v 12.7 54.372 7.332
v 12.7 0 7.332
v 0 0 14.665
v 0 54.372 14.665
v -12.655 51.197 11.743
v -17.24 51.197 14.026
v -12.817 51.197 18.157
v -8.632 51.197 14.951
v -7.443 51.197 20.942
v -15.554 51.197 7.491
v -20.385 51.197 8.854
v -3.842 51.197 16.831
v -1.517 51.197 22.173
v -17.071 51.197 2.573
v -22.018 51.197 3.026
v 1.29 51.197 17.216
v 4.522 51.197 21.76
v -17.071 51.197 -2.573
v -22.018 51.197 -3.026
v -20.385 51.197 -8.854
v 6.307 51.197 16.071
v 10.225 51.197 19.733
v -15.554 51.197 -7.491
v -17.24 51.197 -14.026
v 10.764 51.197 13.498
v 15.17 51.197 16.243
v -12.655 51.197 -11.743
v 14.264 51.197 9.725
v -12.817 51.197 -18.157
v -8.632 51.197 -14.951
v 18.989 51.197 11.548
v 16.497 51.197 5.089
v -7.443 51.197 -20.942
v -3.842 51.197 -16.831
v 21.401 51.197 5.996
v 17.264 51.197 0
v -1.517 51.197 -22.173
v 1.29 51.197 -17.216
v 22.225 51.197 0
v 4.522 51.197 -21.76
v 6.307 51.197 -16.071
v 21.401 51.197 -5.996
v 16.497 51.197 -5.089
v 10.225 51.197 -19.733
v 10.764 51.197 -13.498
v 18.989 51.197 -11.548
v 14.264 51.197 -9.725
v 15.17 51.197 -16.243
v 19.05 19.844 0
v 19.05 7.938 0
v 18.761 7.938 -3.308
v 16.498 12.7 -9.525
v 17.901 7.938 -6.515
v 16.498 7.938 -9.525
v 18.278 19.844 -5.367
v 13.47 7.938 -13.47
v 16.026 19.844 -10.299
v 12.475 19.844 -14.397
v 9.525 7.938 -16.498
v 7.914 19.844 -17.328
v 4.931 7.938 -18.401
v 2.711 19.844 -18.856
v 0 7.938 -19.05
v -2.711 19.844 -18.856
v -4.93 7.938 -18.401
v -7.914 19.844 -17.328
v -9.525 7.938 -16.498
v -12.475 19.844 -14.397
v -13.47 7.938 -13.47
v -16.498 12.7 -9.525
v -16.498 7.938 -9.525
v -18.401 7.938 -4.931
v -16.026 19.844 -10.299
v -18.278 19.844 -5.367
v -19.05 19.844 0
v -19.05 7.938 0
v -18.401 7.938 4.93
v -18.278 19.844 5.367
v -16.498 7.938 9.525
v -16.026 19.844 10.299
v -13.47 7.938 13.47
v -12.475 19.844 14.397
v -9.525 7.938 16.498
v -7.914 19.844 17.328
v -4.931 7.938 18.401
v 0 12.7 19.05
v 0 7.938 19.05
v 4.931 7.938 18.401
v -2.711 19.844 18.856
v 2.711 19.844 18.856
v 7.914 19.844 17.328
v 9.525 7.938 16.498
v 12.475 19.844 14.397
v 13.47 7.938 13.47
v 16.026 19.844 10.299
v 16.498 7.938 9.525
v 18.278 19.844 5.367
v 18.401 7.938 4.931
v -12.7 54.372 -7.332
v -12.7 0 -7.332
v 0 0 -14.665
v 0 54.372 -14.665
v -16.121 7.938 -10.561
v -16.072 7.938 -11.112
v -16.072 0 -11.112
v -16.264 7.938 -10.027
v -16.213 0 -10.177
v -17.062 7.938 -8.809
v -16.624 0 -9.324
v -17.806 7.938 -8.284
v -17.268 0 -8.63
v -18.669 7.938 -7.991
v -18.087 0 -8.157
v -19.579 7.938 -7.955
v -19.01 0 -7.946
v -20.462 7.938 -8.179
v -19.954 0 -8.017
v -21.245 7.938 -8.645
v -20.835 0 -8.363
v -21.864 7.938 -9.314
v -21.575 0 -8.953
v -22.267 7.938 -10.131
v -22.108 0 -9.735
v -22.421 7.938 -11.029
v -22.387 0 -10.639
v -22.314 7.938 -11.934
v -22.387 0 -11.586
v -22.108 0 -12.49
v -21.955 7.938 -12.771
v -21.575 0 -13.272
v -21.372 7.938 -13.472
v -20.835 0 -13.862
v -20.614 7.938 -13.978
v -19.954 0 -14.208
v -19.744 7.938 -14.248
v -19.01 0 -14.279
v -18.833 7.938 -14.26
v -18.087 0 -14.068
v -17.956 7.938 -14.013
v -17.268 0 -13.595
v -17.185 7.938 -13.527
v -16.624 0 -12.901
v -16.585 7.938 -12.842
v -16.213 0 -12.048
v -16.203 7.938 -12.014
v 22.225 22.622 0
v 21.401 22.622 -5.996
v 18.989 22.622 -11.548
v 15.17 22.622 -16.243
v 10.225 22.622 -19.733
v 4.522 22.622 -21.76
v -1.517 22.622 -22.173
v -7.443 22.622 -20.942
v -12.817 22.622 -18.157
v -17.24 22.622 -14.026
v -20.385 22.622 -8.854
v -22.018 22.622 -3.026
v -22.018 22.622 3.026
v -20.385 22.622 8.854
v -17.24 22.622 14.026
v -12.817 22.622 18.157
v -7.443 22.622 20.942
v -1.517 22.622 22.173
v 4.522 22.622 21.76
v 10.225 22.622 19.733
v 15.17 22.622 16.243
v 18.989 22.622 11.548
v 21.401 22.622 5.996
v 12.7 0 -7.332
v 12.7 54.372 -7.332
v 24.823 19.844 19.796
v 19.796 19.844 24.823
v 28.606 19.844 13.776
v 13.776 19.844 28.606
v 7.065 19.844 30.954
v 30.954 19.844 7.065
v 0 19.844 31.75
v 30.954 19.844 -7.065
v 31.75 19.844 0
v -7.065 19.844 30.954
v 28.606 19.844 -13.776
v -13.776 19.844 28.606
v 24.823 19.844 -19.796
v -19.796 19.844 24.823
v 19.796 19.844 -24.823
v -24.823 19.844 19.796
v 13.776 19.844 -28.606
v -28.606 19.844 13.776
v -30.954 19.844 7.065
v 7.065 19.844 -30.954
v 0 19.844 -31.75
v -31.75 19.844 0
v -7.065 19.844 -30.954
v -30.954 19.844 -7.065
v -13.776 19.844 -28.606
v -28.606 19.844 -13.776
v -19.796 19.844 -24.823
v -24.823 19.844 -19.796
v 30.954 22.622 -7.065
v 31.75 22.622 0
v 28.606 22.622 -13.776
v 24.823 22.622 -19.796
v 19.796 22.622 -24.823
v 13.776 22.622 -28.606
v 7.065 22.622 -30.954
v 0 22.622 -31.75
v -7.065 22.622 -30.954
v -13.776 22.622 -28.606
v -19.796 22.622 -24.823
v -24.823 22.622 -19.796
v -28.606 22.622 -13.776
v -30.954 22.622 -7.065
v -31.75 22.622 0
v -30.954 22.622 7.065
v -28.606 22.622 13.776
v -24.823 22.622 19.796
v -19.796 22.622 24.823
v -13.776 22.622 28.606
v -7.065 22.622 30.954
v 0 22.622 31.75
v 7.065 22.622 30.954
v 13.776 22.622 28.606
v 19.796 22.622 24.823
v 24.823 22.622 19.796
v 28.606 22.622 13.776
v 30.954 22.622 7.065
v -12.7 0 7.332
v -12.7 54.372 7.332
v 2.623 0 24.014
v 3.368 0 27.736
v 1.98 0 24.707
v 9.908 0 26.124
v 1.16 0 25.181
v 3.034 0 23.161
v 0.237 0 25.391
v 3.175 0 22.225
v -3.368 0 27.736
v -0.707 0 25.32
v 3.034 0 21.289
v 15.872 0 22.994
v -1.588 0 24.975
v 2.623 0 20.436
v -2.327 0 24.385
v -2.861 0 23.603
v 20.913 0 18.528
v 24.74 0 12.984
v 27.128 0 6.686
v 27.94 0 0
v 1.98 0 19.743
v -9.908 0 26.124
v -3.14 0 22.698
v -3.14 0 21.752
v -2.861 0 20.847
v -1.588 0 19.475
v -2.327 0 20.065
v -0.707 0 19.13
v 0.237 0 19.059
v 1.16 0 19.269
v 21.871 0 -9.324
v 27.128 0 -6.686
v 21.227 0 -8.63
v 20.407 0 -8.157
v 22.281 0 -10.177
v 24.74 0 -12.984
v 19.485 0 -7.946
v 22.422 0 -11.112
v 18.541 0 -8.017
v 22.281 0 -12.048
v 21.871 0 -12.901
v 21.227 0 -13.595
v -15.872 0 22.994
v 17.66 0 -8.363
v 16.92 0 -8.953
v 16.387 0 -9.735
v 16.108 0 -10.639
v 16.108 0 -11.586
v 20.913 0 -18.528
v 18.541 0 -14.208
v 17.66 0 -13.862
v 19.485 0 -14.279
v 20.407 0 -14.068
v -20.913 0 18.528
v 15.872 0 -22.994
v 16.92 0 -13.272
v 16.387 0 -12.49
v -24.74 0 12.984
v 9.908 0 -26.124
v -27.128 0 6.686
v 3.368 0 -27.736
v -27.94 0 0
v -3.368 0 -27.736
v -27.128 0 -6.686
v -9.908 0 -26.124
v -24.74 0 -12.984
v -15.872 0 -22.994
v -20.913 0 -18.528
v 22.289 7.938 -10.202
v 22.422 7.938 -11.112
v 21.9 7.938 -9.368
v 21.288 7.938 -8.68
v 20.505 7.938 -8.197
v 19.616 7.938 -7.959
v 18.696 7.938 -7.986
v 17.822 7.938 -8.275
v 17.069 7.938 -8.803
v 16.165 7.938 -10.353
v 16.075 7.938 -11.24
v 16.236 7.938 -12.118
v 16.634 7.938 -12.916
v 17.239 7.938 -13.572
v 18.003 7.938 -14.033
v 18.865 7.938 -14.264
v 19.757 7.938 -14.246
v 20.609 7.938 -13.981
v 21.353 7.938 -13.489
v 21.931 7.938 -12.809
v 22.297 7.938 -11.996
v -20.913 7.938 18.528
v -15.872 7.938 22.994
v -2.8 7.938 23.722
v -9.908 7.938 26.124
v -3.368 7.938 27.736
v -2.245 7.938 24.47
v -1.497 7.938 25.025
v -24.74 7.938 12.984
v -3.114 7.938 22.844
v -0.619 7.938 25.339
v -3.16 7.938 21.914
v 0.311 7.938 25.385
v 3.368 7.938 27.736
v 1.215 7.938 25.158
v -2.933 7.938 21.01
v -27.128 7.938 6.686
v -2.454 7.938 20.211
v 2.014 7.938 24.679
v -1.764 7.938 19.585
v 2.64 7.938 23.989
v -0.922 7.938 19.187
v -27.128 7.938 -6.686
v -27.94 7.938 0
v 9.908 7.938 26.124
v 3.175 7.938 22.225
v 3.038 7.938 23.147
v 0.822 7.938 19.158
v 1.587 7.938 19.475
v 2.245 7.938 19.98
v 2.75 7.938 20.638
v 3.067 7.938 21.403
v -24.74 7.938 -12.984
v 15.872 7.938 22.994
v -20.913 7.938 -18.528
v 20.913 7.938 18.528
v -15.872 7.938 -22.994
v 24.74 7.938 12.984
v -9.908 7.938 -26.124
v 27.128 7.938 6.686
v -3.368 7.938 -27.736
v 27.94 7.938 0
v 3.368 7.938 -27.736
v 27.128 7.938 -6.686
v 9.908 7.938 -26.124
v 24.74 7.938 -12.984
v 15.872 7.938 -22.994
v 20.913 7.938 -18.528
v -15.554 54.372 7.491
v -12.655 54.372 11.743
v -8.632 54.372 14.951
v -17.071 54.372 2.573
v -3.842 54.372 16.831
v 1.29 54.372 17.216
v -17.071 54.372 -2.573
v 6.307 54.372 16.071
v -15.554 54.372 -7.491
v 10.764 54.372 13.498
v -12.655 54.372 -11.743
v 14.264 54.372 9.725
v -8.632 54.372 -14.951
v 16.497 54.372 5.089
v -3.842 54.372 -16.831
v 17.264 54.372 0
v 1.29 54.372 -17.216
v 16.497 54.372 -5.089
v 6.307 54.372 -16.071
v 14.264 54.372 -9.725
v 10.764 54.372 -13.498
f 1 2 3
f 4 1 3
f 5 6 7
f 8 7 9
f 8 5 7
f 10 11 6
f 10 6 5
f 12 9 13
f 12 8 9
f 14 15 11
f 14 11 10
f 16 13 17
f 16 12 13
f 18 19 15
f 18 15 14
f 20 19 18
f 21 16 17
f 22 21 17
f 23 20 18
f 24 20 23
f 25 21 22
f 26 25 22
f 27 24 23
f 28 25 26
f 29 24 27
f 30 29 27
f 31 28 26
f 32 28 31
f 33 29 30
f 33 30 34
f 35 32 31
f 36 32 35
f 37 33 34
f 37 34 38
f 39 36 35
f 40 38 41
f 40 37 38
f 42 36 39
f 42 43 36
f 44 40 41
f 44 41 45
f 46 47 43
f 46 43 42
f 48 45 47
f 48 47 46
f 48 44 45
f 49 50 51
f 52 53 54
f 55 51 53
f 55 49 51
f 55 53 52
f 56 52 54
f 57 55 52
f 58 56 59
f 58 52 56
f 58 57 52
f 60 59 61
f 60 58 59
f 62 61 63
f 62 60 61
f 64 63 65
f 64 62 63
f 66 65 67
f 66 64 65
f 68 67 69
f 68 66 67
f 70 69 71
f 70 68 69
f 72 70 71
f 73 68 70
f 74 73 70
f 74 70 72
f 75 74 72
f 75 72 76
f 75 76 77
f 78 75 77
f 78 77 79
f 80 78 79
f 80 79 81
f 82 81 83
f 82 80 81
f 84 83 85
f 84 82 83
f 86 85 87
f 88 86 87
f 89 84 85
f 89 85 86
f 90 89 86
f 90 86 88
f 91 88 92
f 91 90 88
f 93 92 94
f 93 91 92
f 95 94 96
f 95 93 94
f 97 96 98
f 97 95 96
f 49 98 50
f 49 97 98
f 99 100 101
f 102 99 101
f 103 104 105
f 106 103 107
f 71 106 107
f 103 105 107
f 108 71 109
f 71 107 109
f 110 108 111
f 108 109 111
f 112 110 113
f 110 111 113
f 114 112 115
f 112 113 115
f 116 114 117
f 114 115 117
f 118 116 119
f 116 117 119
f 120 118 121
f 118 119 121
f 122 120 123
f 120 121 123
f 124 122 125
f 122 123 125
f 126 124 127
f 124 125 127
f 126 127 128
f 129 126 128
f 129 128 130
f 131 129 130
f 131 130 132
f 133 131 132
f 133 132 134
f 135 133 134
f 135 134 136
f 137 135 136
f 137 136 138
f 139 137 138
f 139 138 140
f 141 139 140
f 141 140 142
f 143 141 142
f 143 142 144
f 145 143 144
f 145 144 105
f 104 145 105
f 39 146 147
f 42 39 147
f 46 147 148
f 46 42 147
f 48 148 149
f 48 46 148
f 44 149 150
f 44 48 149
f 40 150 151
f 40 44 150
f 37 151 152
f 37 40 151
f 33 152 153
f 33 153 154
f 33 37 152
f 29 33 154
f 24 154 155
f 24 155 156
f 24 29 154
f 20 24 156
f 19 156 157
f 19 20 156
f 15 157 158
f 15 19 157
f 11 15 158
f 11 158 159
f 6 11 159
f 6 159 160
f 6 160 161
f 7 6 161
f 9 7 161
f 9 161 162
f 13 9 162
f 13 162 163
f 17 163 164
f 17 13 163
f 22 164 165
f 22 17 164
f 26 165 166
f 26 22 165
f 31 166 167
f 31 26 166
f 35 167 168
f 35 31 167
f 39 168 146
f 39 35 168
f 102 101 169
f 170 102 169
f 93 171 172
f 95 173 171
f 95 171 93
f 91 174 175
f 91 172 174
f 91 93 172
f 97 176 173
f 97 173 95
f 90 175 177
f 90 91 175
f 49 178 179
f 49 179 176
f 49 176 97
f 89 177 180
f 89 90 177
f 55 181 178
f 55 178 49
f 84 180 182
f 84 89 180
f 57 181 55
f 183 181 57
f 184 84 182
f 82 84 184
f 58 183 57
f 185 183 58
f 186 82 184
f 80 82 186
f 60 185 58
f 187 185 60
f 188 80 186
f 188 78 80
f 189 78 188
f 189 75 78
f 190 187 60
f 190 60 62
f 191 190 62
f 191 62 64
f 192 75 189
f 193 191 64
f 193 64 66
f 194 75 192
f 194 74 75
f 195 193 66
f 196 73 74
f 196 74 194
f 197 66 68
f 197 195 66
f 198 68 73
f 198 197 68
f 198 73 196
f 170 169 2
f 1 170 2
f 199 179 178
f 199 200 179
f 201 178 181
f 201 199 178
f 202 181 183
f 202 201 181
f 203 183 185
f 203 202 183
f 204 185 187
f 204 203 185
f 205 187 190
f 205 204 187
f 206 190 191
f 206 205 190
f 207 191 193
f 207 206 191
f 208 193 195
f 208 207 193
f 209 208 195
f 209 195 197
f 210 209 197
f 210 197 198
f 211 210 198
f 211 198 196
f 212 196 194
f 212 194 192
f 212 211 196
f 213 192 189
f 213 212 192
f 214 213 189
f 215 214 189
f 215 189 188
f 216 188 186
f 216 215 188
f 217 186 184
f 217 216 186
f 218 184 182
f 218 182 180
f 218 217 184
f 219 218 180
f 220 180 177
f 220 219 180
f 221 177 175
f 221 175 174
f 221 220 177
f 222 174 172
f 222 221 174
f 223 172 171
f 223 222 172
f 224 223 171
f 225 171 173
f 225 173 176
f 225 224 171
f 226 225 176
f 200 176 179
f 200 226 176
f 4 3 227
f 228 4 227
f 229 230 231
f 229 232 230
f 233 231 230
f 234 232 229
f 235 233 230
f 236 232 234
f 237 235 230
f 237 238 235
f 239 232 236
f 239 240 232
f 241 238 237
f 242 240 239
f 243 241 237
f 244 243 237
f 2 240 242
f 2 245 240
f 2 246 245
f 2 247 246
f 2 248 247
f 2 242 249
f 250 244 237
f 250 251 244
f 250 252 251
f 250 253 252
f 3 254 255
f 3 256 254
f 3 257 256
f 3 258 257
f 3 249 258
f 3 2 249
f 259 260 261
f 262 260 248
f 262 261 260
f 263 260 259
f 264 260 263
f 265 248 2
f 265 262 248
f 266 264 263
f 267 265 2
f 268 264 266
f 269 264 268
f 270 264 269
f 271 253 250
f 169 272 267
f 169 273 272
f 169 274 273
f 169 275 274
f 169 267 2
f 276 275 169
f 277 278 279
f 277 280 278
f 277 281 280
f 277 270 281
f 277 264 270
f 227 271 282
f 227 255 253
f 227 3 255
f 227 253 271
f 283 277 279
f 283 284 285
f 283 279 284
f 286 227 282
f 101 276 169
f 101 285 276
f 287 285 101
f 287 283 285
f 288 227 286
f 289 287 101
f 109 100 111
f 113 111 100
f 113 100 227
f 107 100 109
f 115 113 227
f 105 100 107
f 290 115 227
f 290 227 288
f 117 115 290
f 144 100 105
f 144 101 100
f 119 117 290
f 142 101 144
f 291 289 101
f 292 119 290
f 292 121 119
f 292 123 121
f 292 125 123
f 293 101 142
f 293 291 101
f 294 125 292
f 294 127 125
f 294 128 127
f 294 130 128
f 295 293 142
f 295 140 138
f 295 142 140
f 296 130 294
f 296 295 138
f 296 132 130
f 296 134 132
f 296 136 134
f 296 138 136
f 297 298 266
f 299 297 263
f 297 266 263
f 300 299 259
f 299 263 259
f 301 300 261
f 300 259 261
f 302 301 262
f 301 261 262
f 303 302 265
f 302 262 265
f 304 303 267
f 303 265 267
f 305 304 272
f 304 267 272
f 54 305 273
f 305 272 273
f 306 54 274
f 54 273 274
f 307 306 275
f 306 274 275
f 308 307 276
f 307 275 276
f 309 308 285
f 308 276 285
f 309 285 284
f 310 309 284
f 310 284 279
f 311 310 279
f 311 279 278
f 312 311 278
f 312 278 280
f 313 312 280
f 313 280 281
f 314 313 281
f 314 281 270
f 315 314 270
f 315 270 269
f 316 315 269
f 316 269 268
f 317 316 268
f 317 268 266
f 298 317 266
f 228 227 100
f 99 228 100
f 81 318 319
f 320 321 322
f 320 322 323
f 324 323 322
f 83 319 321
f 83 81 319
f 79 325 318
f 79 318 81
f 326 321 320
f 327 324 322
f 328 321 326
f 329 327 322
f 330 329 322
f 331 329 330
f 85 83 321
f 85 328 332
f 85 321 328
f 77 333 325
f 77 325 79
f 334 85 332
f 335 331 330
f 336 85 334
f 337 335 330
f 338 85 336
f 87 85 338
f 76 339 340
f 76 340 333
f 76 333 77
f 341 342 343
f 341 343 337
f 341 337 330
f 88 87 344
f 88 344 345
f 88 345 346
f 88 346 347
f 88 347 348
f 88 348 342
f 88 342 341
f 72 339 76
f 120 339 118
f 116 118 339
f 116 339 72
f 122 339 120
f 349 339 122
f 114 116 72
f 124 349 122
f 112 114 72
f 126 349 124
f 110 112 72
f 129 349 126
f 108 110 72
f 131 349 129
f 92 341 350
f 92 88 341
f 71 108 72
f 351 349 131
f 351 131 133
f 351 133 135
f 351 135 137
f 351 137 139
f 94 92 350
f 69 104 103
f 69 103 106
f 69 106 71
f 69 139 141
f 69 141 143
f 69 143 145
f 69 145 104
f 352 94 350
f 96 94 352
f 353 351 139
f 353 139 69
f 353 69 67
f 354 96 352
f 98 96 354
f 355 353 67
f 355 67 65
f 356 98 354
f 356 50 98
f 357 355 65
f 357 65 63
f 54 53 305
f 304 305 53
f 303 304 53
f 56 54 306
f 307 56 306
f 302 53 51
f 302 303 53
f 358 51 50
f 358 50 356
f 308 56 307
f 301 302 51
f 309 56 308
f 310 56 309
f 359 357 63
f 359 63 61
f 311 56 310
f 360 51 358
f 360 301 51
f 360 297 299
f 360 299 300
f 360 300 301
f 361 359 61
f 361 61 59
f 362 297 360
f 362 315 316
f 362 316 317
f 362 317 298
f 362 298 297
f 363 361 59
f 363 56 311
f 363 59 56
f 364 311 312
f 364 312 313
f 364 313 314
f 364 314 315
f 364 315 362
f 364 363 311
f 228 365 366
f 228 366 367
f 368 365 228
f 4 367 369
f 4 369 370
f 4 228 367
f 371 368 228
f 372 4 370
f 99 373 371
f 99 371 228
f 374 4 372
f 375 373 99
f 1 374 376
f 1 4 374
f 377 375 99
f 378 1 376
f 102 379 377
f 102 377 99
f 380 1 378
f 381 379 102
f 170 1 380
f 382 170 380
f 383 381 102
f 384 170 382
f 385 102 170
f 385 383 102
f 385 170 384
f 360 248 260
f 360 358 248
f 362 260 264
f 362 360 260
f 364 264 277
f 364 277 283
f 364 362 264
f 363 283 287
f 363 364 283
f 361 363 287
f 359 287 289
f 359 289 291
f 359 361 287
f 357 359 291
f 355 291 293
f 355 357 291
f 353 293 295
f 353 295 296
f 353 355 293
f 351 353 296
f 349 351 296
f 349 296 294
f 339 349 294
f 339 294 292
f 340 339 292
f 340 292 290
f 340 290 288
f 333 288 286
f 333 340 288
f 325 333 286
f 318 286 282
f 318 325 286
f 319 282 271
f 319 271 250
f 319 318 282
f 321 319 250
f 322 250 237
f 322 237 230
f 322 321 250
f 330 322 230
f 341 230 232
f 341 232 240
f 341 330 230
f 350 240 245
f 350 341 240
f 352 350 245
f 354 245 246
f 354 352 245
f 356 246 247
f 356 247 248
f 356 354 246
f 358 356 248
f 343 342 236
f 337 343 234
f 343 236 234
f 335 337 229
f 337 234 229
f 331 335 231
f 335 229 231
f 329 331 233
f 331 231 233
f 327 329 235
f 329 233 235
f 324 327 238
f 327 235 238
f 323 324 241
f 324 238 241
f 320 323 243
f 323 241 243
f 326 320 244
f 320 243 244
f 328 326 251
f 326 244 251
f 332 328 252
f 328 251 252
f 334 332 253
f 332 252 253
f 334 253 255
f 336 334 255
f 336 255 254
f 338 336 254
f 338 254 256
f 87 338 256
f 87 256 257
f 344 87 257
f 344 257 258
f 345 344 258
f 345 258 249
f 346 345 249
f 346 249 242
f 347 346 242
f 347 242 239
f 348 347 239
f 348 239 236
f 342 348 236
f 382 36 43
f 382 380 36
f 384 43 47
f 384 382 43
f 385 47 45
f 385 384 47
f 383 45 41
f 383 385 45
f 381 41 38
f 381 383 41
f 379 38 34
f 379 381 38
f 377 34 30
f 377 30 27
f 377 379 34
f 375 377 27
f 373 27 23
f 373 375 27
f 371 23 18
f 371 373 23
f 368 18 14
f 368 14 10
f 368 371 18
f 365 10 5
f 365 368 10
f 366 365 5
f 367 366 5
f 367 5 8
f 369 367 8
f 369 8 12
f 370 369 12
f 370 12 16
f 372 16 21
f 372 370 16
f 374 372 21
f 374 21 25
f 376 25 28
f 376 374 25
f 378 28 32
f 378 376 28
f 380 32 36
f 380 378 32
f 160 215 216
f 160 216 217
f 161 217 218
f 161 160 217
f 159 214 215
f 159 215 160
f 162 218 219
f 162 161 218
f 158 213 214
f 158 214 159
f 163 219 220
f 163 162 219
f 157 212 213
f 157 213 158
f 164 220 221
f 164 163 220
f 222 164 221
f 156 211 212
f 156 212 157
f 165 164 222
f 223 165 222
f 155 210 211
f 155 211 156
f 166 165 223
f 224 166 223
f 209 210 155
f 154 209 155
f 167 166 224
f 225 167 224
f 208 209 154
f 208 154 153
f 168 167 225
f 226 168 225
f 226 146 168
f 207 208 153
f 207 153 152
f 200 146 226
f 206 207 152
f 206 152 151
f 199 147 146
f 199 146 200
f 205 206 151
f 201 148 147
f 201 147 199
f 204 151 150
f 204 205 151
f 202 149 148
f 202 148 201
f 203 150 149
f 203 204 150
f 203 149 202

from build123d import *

# Parameters (mm, degrees)
CUT_EXTRUDE1_DEPTH = 101.6
SKETCH3_R          = 3.175
CUT_EXTRUDE2_DEPTH = 12.7


with BuildPart() as part:
    # Sketch1 → Revolve1 (revolve)
    with BuildSketch(Plane.XY):
        Polygon((0, 0), (27.94, 0), (27.94, 7.9375), (19.05, 7.9375), (19.05, 19.84375), (31.75, 19.84375), (31.75, 22.621875), (22.225, 22.621875), (22.225, 51.196875), (17.2640625, 51.196875), (17.2640625, 54.371875), (0, 54.371875), align=None)
    revolve(axis=Axis((0, 0, 0), (0, 1, 0)))

    # Sketch2 → Cut-Extrude1 (cut)
    with BuildSketch(Plane.XZ):
        Polygon((12.7, 7.332348419), (0, 14.664696837), (-12.7, 7.332348419), (-12.7, -7.332348419), (0, -14.664696837), (12.7, -7.332348419), align=None)
    extrude(amount=-CUT_EXTRUDE1_DEPTH, mode=Mode.SUBTRACT)

    # Sketch3 → Cut-Extrude2 (cut)
    with BuildSketch(Plane.XZ):
        with Locations((0, 22.225)):
            Circle(SKETCH3_R)
        with Locations((19.247414599, -11.1125)):
            Circle(SKETCH3_R)
        with Locations((-19.247414599, -11.1125)):
            Circle(SKETCH3_R)
    extrude(amount=-CUT_EXTRUDE2_DEPTH, mode=Mode.SUBTRACT)


solid = part.part
